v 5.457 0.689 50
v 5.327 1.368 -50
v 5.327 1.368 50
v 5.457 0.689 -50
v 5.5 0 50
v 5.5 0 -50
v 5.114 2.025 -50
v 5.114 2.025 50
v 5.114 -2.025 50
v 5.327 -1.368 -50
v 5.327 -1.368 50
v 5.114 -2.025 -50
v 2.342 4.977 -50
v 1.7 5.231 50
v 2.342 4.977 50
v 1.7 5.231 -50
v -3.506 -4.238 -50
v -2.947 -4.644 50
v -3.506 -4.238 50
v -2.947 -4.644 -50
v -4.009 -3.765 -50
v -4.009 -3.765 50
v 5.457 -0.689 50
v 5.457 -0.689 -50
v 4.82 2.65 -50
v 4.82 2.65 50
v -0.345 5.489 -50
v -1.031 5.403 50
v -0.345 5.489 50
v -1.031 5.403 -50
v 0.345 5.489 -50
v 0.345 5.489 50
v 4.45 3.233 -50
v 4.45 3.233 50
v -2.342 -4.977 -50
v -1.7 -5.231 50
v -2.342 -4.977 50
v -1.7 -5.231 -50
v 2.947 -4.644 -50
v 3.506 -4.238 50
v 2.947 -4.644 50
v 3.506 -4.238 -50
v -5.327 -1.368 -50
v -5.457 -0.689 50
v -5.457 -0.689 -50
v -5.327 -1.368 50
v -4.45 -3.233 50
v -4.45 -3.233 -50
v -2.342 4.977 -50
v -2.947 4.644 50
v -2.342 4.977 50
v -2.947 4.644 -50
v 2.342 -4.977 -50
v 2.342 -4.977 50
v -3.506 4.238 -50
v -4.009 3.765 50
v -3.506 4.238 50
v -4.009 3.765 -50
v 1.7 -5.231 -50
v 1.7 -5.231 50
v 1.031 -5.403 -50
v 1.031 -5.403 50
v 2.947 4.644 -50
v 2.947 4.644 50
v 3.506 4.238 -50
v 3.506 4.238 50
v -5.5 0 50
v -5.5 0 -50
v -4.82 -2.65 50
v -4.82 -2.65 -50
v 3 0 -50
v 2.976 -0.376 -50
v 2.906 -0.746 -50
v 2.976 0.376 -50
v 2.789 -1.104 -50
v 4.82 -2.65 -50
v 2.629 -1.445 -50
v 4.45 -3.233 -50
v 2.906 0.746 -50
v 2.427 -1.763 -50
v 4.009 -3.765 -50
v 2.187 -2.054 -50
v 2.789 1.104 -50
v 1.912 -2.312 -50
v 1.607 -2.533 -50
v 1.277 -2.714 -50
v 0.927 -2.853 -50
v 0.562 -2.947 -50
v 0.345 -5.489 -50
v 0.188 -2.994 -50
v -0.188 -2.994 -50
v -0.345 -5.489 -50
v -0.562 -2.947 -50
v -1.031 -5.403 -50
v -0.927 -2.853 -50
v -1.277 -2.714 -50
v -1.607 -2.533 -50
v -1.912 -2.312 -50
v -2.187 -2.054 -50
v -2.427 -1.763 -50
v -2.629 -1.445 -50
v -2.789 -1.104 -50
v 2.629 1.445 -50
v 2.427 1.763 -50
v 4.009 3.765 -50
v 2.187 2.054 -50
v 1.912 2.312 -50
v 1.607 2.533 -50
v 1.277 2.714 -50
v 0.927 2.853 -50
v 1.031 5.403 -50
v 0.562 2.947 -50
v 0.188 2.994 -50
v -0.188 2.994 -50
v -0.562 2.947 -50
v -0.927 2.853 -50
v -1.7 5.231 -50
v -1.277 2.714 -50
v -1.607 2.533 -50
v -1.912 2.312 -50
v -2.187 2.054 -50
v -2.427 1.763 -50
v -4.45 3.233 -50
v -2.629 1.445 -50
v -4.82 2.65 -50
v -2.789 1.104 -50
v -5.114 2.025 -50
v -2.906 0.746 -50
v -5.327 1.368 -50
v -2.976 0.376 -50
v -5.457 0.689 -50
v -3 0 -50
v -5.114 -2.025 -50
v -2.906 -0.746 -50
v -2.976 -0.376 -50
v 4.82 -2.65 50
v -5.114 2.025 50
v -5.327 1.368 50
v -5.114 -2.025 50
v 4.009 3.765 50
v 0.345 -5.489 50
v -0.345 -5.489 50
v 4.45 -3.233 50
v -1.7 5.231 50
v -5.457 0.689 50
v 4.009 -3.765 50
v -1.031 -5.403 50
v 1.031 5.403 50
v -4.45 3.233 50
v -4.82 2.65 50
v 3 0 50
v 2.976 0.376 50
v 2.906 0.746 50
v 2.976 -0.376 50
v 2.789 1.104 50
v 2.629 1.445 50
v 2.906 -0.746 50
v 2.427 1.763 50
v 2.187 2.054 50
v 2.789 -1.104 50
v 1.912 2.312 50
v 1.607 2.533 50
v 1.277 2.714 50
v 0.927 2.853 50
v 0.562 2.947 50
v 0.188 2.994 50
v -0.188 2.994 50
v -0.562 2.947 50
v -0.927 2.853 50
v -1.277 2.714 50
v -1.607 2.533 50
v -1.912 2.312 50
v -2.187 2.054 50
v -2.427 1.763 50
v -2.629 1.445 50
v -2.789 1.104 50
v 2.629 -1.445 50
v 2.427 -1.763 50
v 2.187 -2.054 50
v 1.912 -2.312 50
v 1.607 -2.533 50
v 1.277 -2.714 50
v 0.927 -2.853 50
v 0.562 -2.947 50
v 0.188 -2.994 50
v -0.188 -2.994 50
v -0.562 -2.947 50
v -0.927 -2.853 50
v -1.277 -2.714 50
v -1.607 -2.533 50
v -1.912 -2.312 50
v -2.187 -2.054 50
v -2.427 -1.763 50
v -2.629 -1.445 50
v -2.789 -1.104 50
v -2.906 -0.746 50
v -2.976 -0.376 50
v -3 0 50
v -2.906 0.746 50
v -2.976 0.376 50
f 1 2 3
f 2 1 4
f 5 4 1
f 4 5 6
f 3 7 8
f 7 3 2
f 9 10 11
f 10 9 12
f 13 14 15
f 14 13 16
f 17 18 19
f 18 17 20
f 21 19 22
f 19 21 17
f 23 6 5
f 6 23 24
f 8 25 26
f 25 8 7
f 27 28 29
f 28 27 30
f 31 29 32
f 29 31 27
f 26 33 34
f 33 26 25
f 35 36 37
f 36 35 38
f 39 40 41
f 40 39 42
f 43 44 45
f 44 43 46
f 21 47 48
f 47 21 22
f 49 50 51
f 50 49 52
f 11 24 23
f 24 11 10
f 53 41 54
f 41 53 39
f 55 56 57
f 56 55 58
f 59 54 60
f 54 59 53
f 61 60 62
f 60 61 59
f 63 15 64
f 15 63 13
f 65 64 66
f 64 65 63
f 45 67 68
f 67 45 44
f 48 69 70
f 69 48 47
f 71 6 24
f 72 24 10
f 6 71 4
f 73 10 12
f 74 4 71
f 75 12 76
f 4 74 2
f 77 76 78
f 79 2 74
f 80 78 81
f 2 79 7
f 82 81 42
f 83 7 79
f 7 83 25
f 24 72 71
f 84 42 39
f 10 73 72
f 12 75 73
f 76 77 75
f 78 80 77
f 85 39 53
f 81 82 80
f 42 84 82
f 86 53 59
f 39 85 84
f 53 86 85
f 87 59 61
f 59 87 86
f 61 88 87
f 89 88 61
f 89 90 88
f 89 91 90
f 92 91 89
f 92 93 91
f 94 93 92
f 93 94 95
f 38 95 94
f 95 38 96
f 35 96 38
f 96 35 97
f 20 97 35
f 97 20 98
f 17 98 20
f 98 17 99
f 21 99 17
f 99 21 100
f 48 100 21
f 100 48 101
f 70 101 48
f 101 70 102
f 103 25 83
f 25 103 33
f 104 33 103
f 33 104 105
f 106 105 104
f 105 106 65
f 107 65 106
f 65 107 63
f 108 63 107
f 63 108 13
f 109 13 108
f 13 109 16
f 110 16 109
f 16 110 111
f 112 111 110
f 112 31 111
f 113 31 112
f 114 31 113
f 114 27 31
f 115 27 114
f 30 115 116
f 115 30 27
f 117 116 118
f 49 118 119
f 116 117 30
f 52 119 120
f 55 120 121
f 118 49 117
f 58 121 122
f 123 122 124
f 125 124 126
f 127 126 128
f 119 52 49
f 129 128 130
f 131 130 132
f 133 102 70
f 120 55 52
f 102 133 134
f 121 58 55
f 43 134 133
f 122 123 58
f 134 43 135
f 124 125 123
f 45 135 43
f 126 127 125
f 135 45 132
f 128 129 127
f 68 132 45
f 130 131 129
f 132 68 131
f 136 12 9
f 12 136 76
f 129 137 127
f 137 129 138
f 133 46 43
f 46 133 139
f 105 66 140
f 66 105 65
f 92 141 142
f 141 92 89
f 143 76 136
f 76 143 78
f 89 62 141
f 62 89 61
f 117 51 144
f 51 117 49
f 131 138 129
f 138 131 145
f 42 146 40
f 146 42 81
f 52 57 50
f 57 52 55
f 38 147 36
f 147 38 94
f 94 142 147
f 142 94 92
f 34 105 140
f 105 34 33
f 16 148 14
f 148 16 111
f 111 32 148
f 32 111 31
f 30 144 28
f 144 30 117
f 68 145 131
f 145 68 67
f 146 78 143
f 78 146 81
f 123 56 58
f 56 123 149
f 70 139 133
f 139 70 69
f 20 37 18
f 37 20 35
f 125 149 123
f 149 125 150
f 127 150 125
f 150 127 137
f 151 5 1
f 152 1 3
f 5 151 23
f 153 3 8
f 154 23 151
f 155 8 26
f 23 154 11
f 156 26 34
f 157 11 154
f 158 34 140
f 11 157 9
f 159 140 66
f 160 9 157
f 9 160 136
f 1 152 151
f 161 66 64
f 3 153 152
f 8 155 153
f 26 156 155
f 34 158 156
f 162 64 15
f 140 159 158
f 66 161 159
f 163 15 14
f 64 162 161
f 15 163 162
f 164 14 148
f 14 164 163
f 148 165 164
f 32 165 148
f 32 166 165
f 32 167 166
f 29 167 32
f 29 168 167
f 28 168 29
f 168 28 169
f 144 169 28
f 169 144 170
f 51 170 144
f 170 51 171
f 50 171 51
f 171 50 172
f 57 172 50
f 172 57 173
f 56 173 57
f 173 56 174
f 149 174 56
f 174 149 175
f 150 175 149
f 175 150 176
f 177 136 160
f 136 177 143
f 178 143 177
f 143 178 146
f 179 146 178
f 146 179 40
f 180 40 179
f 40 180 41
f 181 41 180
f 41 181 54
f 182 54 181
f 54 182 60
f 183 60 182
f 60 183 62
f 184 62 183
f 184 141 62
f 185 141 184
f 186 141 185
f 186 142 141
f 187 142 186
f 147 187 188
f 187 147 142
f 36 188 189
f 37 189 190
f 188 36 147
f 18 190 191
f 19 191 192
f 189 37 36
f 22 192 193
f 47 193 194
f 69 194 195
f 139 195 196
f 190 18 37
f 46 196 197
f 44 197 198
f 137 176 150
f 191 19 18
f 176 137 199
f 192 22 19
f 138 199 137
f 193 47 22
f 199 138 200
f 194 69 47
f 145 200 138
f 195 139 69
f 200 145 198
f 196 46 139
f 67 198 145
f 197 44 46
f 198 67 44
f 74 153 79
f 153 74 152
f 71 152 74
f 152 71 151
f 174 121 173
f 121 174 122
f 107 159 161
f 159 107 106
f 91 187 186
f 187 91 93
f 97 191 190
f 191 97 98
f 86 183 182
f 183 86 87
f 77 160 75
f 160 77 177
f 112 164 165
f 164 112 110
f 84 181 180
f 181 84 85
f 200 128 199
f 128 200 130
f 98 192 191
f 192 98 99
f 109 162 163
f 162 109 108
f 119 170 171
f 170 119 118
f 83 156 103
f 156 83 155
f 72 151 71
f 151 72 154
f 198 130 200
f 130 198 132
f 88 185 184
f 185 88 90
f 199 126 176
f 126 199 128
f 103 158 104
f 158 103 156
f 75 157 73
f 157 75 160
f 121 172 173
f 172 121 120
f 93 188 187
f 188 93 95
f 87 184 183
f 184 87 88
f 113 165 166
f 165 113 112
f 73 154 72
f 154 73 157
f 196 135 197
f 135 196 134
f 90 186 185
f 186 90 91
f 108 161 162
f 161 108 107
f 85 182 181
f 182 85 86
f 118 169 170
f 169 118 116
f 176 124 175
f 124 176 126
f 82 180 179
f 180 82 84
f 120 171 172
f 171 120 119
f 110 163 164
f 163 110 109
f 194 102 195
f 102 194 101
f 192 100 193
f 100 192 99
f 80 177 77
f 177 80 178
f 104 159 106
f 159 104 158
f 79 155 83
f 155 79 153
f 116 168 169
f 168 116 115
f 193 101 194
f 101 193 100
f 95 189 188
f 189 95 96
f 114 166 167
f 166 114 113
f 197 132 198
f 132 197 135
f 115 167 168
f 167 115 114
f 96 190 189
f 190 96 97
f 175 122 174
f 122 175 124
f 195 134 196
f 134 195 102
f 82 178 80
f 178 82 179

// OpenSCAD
$fn = 50;


difference() {
	union() {
		translate(v = [0, 0, -50.0000000000]) {
			cylinder(h = 100, r = 5.5000000000);
		}
	}
	union() {
		translate(v = [0, 0, -100.0000000000]) {
			cylinder(h = 200, r = 3.0000000000);
		}
	}
}
